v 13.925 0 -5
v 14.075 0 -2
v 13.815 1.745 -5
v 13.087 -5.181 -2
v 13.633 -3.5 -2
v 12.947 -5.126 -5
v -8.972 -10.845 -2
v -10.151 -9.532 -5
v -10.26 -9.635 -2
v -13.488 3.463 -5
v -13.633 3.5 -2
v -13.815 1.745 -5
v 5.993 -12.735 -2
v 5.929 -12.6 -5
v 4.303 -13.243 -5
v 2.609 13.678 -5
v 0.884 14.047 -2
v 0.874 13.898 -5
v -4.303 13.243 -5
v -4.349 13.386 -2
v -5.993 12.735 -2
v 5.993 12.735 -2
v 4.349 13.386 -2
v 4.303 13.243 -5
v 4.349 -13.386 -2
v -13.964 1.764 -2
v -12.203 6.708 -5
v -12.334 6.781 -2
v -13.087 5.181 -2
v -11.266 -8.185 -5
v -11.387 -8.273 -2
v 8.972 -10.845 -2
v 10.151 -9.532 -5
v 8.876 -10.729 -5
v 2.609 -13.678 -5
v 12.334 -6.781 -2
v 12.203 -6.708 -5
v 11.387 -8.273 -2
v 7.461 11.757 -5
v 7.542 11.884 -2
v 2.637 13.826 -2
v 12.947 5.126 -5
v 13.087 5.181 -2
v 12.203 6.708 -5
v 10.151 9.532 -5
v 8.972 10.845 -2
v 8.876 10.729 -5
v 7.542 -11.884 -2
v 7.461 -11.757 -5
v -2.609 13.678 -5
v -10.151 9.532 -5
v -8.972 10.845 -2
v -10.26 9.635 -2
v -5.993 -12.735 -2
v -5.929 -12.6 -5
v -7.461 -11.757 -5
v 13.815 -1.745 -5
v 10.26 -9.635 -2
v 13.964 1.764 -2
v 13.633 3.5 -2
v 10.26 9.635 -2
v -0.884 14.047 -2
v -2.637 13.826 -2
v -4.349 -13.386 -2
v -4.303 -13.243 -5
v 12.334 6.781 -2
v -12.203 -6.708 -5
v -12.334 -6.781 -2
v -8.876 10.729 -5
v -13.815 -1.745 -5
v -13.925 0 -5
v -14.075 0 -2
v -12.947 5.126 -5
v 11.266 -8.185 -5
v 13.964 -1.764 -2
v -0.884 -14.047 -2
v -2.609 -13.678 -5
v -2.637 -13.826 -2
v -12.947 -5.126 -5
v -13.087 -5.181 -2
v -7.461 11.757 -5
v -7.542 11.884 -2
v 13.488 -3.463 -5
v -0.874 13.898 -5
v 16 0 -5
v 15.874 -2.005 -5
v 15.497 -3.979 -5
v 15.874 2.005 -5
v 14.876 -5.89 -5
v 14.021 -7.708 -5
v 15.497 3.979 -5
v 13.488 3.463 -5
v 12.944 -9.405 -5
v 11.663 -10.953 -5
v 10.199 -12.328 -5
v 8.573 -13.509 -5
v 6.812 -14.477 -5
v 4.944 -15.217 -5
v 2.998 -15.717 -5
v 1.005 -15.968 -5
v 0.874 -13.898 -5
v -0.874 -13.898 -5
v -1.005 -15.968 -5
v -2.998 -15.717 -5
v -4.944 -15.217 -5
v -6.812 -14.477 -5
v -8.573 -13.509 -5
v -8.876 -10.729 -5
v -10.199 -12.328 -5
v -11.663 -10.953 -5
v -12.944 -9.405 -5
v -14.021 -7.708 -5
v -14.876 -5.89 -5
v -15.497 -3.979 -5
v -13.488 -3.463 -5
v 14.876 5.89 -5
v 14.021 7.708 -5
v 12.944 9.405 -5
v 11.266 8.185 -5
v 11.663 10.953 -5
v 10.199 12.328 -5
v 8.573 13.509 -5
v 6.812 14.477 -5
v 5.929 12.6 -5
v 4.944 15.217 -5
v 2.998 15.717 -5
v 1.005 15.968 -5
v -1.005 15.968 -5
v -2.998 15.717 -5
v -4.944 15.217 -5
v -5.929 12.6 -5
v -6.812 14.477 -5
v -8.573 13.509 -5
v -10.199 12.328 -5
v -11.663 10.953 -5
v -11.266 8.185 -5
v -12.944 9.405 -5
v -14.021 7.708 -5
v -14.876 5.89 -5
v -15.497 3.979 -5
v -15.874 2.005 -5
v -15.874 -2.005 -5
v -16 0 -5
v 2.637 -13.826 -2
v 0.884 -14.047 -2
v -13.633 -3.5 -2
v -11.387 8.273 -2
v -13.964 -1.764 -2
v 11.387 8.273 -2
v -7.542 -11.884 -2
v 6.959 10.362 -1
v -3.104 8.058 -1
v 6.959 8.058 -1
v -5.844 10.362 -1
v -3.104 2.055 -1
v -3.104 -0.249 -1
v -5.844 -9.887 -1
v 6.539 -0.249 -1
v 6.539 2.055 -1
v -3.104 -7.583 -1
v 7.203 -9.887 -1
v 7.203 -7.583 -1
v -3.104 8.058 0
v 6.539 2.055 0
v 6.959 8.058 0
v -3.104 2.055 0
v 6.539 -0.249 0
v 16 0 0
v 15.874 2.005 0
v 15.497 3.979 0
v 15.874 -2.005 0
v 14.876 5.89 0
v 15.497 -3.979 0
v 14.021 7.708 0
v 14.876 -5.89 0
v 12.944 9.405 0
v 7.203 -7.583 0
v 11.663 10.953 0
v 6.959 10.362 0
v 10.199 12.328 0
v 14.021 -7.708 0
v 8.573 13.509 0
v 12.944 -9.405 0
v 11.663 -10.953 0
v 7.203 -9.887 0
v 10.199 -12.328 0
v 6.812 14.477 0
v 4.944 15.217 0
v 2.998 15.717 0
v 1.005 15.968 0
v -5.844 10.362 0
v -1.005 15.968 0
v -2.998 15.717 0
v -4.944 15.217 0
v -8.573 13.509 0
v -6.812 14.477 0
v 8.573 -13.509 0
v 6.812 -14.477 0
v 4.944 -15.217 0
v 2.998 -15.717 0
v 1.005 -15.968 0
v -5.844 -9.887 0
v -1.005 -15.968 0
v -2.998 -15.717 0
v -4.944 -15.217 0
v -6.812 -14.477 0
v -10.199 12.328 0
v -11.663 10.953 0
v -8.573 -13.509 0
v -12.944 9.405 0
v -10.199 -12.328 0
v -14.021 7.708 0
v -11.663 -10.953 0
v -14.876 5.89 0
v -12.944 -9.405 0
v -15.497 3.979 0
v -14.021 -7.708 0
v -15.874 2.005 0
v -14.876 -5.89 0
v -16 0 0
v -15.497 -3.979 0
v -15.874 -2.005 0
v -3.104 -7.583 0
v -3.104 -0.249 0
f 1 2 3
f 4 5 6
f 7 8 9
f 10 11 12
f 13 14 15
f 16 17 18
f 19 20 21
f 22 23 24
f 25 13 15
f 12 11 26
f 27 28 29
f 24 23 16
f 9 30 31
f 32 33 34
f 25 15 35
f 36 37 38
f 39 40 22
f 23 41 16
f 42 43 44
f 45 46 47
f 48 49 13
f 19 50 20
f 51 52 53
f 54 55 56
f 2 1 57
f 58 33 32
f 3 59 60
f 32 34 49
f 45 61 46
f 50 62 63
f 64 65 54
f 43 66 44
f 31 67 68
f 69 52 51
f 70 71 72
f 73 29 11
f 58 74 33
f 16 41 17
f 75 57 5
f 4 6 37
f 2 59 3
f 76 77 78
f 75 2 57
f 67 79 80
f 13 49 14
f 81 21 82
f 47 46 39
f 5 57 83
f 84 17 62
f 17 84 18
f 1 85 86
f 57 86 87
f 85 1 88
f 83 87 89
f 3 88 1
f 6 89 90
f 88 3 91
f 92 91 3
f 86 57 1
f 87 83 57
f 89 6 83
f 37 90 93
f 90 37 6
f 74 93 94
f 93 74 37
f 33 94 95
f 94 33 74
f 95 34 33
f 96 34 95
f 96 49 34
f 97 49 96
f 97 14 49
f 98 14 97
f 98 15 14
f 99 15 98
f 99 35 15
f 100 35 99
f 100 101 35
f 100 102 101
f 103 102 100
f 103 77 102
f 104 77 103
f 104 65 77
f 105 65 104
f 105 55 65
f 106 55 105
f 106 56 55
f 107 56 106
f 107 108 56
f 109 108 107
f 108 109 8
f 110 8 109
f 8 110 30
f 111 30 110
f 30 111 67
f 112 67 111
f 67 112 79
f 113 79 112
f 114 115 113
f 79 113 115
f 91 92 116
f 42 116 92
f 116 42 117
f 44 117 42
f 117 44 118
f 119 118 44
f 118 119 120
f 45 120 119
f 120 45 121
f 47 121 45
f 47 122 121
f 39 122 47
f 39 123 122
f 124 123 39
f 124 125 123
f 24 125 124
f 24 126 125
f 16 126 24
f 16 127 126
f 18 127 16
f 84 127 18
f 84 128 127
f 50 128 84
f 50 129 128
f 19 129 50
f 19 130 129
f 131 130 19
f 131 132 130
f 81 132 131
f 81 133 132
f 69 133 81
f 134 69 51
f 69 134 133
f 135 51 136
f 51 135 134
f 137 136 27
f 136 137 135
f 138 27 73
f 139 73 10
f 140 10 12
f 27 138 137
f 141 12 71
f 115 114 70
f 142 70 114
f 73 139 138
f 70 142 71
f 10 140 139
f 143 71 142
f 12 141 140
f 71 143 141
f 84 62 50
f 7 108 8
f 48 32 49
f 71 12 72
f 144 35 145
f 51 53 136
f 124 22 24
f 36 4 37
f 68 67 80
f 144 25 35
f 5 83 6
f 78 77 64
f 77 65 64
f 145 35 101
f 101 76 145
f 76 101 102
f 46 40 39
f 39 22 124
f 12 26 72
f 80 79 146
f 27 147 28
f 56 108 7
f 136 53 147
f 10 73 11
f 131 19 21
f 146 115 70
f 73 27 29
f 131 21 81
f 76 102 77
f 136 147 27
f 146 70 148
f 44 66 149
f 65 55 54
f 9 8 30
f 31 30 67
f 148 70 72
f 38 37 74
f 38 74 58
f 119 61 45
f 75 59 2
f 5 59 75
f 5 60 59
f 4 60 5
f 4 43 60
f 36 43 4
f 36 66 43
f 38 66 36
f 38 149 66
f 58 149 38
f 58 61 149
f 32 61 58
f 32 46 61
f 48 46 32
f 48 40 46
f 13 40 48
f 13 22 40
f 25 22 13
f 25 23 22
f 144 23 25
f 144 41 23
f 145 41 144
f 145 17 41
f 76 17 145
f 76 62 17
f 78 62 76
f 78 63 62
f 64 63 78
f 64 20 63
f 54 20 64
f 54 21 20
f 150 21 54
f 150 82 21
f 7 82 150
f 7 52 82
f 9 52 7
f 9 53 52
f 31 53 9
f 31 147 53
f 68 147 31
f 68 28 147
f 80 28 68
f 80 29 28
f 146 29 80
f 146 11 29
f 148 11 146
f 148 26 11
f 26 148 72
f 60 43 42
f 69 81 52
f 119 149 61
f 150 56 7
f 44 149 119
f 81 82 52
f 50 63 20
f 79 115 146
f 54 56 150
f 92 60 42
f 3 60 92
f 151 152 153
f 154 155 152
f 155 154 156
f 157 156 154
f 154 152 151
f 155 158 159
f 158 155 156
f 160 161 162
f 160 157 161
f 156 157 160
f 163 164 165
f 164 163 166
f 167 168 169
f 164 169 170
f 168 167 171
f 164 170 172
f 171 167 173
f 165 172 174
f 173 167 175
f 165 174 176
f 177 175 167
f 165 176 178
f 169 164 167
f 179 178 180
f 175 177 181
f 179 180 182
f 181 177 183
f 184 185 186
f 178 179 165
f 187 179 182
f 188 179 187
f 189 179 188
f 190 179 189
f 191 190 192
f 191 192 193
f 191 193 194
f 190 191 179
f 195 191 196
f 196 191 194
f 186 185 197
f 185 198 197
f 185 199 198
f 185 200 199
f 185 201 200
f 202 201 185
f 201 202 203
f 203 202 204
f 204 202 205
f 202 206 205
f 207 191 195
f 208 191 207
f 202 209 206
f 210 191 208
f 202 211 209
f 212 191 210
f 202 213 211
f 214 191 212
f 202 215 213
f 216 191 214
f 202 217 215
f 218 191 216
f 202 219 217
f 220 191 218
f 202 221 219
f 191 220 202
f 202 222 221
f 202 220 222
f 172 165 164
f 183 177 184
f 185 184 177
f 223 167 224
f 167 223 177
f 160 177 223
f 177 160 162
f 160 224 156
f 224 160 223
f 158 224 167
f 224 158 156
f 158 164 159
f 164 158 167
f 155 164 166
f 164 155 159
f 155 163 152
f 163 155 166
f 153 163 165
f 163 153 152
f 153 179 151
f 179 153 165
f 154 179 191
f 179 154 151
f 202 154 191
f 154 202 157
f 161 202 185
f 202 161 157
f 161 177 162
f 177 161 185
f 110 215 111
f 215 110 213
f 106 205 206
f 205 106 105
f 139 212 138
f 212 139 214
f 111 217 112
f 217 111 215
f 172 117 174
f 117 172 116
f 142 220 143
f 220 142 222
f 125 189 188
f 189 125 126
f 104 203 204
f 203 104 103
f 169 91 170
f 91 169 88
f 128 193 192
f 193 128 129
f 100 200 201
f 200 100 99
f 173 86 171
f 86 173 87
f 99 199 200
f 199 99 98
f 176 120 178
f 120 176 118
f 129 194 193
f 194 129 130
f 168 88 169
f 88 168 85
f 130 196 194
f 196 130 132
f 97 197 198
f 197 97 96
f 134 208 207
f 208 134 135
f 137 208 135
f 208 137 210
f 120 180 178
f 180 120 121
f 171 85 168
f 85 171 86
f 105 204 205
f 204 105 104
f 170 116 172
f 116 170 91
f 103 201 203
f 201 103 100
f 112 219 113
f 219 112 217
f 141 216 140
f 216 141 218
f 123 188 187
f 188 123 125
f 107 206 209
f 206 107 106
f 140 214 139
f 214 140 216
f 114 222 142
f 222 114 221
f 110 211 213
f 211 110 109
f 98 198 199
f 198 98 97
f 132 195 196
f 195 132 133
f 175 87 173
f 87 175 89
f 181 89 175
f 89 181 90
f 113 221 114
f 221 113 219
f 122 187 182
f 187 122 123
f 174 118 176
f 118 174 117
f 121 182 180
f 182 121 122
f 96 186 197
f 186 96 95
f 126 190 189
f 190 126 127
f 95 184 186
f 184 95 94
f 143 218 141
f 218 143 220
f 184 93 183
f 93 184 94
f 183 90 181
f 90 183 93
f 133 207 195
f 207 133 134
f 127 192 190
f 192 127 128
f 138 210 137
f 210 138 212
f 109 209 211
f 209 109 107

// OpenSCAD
$fn = 50;


difference() {
	union() {
		translate(v = [0, 0, -5.0000000000]) {
			cylinder(h = 5, r = 16.0000000000);
		}
	}
	union() {
		#translate(v = [0, 0, -5.0000000000]) {
			cylinder(h = 3, r1 = 13.9250000000, r2 = 14.0750000000);
		}
		translate(v = [0, 0, -1]) {
			linear_extrude(height = 1) {
				text(font = "Impact", halign = "center", size = 20, text = "E", valign = "center");
			}
		}
	}
}
